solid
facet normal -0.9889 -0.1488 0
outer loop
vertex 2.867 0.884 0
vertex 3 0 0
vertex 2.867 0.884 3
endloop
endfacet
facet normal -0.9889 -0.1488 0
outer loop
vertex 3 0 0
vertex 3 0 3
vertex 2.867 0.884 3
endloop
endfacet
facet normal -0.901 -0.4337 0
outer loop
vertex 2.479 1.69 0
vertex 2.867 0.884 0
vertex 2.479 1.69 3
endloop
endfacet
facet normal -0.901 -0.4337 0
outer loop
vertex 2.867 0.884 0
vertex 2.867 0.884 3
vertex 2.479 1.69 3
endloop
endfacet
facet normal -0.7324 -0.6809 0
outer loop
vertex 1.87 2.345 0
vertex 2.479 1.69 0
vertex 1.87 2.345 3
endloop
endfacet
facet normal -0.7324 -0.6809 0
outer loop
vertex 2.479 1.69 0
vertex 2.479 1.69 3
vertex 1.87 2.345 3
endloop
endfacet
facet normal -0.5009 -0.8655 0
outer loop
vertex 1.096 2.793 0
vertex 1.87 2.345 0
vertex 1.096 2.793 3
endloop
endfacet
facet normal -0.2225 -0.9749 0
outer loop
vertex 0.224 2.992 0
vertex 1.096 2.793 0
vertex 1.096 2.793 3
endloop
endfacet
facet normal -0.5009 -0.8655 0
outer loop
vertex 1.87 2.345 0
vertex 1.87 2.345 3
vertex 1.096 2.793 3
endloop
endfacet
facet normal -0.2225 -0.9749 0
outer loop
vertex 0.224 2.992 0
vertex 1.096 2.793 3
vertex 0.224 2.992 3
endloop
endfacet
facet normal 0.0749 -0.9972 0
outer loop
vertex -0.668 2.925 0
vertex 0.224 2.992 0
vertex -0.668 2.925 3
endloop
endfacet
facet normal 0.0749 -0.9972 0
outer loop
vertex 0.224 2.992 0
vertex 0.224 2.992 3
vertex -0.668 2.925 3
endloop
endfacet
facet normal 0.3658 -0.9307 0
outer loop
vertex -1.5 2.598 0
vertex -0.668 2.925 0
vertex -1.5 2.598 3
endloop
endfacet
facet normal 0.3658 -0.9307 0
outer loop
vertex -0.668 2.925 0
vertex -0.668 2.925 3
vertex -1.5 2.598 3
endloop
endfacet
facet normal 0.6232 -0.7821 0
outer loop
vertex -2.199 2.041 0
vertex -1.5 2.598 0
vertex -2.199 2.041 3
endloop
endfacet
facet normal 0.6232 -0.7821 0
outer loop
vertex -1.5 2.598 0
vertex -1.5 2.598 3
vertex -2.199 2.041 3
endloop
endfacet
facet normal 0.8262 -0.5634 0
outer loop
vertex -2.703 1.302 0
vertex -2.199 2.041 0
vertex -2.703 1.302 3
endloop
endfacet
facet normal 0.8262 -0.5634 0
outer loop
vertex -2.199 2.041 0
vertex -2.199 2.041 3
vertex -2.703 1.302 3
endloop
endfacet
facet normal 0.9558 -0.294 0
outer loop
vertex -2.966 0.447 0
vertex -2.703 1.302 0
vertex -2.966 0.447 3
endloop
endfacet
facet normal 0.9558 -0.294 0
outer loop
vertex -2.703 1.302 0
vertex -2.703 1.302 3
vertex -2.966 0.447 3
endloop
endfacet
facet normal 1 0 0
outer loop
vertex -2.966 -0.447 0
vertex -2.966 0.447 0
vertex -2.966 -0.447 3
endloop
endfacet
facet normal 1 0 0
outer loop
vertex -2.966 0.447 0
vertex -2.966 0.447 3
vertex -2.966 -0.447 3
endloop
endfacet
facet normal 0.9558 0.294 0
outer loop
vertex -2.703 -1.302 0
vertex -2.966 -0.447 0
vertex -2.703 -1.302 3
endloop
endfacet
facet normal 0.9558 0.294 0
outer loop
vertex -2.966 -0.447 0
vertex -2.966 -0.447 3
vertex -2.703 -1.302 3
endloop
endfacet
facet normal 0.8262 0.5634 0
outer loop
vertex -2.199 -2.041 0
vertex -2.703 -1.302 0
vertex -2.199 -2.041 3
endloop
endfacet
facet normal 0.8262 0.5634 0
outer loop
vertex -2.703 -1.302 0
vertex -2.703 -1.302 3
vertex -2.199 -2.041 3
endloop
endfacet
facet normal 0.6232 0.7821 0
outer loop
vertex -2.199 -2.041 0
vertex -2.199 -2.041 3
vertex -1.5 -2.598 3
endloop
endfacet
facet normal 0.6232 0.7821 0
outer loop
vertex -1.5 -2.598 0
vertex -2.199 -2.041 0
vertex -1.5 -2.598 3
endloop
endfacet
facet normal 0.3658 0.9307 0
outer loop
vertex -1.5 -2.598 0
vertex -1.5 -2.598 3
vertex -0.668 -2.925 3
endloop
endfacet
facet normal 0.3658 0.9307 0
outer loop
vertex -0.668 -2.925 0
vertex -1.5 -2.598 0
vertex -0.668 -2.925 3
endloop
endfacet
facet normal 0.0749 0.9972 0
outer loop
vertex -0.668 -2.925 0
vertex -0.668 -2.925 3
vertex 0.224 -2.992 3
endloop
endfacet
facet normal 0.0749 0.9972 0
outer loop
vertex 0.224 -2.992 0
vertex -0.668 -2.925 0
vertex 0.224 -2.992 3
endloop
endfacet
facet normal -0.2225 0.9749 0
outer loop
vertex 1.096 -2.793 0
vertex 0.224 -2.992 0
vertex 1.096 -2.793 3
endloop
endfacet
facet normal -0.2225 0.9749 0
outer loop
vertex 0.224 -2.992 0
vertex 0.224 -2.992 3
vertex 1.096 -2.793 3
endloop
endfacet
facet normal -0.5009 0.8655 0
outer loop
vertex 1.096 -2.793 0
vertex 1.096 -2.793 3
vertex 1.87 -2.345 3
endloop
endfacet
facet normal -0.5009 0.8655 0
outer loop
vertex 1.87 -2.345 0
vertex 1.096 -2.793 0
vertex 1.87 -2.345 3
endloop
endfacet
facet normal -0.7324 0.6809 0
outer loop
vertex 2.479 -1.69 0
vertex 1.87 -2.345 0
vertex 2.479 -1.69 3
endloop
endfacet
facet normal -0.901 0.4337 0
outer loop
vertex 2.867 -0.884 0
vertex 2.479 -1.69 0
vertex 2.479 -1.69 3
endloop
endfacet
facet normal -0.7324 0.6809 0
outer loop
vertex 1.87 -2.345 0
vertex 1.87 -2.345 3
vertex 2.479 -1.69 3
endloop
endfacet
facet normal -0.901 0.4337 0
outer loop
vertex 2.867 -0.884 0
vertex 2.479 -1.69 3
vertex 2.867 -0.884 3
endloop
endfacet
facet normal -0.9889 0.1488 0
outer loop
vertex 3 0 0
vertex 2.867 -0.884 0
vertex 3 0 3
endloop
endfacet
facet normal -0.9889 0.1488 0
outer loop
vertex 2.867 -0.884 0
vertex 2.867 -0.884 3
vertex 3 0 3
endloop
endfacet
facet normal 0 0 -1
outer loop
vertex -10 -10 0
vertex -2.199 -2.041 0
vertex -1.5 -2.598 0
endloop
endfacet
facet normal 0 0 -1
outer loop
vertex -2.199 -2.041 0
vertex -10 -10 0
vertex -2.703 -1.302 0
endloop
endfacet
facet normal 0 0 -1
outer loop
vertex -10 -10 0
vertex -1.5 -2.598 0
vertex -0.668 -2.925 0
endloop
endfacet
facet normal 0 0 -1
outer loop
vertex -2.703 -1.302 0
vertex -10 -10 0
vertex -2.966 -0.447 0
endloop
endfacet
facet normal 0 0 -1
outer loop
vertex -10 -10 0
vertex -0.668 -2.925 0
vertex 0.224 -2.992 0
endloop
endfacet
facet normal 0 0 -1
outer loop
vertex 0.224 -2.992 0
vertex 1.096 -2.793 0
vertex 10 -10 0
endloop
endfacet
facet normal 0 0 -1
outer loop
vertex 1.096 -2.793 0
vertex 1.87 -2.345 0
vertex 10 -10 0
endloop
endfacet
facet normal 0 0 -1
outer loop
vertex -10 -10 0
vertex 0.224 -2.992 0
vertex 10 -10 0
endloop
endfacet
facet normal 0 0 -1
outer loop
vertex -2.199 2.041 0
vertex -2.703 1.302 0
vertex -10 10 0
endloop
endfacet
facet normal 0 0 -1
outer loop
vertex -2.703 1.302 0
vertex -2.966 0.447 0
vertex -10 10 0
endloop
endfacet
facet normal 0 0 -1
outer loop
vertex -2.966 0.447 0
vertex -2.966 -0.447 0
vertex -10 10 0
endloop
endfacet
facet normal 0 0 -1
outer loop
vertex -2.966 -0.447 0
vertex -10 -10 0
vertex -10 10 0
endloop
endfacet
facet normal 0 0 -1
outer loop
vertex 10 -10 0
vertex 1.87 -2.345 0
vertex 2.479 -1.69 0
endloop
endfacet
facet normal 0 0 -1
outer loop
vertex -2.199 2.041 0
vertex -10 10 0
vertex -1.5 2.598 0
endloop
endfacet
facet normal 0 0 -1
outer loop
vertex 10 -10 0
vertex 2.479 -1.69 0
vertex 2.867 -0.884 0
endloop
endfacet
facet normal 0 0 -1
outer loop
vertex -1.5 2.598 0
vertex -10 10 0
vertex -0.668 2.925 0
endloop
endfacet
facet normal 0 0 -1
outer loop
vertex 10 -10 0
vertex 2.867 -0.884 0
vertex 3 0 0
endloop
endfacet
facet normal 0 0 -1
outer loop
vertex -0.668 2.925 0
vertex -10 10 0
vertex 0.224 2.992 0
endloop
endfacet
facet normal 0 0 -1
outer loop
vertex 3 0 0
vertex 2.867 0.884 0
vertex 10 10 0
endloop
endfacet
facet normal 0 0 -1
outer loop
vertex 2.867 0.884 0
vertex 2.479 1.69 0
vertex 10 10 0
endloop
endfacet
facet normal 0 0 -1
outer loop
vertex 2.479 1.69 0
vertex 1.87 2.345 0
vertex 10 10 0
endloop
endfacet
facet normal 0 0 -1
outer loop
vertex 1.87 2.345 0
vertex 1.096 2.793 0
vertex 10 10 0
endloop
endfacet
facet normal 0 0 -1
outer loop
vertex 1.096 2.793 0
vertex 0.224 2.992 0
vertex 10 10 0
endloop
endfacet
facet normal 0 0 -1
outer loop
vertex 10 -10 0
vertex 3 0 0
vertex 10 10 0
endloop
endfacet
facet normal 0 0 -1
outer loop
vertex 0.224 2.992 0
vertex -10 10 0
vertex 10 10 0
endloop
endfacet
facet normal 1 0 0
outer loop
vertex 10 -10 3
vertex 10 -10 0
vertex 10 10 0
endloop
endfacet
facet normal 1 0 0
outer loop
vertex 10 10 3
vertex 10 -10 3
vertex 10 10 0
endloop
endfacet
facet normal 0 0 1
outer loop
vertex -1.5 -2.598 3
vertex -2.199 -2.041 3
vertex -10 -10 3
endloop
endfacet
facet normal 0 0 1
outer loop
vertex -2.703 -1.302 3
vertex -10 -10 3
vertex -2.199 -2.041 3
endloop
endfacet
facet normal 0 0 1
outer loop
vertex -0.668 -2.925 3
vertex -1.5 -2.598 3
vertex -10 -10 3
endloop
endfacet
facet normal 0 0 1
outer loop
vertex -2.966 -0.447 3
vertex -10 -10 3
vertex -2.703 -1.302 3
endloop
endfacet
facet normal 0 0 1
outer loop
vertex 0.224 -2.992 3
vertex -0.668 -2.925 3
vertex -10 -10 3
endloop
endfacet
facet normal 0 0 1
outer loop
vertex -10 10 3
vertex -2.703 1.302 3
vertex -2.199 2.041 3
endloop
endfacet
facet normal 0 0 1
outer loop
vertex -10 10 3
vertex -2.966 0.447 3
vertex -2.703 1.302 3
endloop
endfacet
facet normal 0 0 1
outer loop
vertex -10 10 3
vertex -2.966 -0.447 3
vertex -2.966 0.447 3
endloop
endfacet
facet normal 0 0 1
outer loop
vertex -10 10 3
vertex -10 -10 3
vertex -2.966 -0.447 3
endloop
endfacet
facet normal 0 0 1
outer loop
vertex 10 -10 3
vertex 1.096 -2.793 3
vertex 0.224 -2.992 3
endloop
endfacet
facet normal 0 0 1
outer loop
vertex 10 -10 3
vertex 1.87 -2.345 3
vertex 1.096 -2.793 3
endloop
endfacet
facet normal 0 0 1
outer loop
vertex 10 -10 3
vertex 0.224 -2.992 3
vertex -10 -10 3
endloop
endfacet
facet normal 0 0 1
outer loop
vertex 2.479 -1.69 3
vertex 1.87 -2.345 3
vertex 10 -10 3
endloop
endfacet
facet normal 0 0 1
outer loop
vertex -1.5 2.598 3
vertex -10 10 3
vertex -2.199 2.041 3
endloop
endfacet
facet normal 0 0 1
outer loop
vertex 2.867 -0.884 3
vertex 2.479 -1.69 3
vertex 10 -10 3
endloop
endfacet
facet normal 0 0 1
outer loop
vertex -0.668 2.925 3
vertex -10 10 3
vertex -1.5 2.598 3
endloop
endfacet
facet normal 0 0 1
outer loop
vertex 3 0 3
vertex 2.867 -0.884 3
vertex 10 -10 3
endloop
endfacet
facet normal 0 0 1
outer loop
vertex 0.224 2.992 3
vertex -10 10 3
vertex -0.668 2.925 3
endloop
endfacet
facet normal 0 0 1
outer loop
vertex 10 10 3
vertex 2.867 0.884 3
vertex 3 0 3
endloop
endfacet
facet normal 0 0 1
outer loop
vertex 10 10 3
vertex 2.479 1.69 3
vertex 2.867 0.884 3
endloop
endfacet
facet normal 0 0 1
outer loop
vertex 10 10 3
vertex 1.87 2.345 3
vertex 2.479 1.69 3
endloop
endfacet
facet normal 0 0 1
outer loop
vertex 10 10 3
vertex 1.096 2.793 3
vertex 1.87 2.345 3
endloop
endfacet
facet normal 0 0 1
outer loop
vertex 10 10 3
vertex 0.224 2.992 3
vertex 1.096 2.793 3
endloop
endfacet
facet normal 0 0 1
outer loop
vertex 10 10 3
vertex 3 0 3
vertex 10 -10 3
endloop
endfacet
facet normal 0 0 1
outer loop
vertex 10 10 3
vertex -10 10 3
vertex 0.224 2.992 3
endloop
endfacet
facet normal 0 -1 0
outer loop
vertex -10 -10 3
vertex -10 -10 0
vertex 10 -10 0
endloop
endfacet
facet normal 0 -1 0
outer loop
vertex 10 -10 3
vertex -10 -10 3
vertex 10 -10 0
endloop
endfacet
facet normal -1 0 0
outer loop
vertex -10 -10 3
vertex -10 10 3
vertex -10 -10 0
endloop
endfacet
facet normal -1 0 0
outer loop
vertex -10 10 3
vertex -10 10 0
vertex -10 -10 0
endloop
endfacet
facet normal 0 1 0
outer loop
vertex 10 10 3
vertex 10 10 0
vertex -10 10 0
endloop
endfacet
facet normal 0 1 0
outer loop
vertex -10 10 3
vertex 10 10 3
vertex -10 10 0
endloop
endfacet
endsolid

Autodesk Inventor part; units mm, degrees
ref_plane "YZ Plane" through (0, 0, 0) normal (1, 0, 0) x (0, 1, 0)
ref_plane "XZ Plane" through (0, 0, 0) normal (0, 1, 0) x (-1, 0, 0)
ref_plane "XY Plane" through (0, 0, 0) normal (0, 0, 1) x (1, 0, 0)
sketch "Sketch66" plane through (0, 0, 0) normal (0, 0, 1) x (1, 0, 0)
  line L0 (-10, -10) -> (10, -10)
  line L1 (10, -10) -> (10, 10)
  line L2 (10, 10) -> (-10, 10)
  line L3 (-10, 10) -> (-10, -10)
  line L4 (-10, -10) -> (10, 10) construction
  line L5 (10, -10) -> (-10, 10) construction
  point P0 (0, 0)
  dimension "d179" = 20
  dimension "d180" = 20
extrude "Extrusion45" add sketch "Sketch66" along normal blind 3
sketch "Sketch67" plane through (0, 0, 3) normal (0, 0, 1) x (1, 0, 0)
  circle A0 centre (0, 0) radius 3
  dimension "d183" = 6
extrude "Extrusion46" cut sketch "Sketch67" against normal blind 3
properties part number "magnet_test_print_v2"
